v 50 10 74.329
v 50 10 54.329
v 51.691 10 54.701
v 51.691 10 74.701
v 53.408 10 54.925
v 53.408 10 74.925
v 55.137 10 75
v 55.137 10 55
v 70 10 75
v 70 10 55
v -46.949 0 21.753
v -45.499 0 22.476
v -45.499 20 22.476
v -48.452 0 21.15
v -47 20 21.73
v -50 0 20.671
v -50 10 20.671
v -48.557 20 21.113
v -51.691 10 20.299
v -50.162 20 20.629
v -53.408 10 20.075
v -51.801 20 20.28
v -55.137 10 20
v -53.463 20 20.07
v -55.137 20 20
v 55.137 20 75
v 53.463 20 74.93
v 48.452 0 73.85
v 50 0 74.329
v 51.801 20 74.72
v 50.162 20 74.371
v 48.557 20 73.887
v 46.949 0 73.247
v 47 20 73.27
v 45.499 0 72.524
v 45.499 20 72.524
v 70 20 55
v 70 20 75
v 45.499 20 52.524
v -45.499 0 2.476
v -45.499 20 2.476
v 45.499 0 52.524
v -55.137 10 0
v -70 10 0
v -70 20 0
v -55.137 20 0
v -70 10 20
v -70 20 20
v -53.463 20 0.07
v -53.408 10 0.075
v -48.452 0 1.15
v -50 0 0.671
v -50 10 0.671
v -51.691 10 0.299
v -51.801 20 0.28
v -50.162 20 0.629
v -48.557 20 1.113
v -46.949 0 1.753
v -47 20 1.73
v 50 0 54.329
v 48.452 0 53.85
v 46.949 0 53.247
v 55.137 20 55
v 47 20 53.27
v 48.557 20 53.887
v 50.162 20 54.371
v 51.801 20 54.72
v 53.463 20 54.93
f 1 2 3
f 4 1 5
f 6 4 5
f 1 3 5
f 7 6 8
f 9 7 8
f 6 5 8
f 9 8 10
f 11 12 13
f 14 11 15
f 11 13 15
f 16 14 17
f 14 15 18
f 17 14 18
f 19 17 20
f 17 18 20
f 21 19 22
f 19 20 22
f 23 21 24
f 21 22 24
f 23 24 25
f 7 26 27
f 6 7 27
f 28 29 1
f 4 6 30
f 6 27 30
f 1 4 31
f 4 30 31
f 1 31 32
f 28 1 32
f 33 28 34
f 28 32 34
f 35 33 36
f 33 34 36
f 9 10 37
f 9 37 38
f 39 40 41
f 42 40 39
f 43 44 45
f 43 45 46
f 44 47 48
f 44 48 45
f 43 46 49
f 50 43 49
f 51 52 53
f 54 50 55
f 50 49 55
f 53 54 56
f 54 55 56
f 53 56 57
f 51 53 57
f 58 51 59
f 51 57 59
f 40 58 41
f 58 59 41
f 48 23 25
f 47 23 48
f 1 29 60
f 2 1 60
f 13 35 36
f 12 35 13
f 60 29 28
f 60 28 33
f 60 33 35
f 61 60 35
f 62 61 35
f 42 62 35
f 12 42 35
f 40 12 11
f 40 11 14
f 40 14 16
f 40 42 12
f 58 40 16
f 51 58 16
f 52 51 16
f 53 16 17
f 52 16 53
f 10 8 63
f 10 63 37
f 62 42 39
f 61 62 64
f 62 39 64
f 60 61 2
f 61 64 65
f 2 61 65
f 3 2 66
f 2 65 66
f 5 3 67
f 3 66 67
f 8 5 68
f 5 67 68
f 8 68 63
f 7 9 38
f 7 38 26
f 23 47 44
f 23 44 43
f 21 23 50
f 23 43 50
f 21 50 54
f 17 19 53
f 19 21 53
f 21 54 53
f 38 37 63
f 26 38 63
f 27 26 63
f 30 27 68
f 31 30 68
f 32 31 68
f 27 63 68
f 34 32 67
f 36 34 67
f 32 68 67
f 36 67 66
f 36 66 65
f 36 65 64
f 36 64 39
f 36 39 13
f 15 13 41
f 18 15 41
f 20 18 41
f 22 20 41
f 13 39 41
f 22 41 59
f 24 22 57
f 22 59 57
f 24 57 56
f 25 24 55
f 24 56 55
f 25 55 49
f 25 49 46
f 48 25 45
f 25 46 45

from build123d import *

# Parameters (mm, degrees)
SALIENTE_EXTRUIR1_DEPTH = 20
REDONDEO1_R             = 20
CROQUIS3_W              = 20
CROQUIS3_H              = 22.736865604
CROQUIS3_H_2            = 22.452131832
CORTAR_EXTRUIR2_DEPTH   = 10


with BuildPart() as part:
    # Croquis1 → Saliente-Extruir1 (new body)
    with BuildSketch(Plane(origin=(0, 0, 0), x_dir=(1, 0, 0), z_dir=(0, 1, 0))):
        Polygon((-70, 0), (-50, 0), (50, -55), (70, -55), (70, -75), (50, -75), (-50, -20), (-70, -20), align=None)
    extrude(amount=SALIENTE_EXTRUIR1_DEPTH)

    # Redondeo1
    redondeo1_edges = [part.edges().sort_by_distance(p)[0] for p in [
        (-50, 10, 0),
        (50, 10, 55),
        (50, 10, 75),
        (-50, 10, 20),
    ]]
    fillet(redondeo1_edges, radius=REDONDEO1_R)

    # Croquis3 → Cortar-Extruir2 (cut)
    with BuildSketch(Plane(origin=(0, 0, 0), x_dir=(1, 0, 0), z_dir=(0, 1, 0))):
        with Locations((-60, -11.368432802)):
            Rectangle(CROQUIS3_W, CROQUIS3_H)
        with Locations((60, -63.773934084)):
            Rectangle(CROQUIS3_W, CROQUIS3_H_2)
    extrude(amount=CORTAR_EXTRUIR2_DEPTH, mode=Mode.SUBTRACT)


solid = part.part
